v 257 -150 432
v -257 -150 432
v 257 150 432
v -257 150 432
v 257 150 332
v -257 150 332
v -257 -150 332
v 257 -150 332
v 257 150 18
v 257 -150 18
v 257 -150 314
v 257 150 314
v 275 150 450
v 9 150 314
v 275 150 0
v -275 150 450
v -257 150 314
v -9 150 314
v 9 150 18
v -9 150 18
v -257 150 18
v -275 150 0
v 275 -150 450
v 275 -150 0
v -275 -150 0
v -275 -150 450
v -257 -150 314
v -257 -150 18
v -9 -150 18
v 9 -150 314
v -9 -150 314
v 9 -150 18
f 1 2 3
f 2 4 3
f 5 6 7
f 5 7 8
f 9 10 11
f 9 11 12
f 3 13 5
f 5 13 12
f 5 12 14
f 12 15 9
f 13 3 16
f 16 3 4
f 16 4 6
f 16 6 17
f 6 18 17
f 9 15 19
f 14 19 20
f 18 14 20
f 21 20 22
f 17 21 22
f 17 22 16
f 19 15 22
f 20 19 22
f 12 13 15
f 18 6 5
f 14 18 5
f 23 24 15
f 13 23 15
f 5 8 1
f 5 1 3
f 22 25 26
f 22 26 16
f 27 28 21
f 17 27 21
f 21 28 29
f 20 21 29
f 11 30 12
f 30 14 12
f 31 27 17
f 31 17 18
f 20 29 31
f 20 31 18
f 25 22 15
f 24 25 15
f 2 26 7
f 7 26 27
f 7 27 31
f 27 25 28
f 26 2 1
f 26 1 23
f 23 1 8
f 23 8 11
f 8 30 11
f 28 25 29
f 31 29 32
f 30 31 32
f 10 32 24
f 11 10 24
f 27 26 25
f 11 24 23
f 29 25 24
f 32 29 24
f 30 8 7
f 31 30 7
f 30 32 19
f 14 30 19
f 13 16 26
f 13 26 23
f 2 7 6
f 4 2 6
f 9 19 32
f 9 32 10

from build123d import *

# Parameters (mm, degrees)
F0_W     = 550
F0_H     = 300
F1_DEPTH = 18
F2_W     = 18
F2_H     = 300
F3_DEPTH = 414
F4_W     = 18
F4_H     = 300
F5_DEPTH = 296
F6_W     = 248
F6_H     = 300
F6_W_2   = 18
F7_DEPTH = 18
F8_W     = 532
F8_H     = 300
F8_W_2   = 18
F9_DEPTH = 18


with BuildPart() as f1:
    # F0 (on Top) → F1 (new body)
    with BuildSketch(Plane.XY):
        Rectangle(F0_W, F0_H)
    extrude(amount=F1_DEPTH)

    # F2 (on face) → F3 (join)
    with BuildSketch(Plane.XY.offset(18)):
        with Locations((-266, 0)):
            Rectangle(F2_W, F2_H)
        with Locations((266, 0)):
            Rectangle(F2_W, F2_H)
    extrude(amount=F3_DEPTH)

    # F4 (on face) → F5 (join)
    with BuildSketch(Plane.XY.offset(18)):
        Rectangle(F4_W, F4_H)
    extrude(amount=F5_DEPTH)

    # F6 (on face) → F7 (join)
    with BuildSketch(Plane.XY.offset(314)):
        with Locations((133, 0)):
            Rectangle(F6_W, F6_H)
        Rectangle(F6_W_2, F6_H)
        with Locations((-133, 0)):
            Rectangle(F6_W, F6_H)
    extrude(amount=F7_DEPTH)

    # F8 (on face) → F9 (join)
    with BuildSketch(Plane.XY.offset(432)):
        with Locations((9, 0)):
            Rectangle(F8_W, F8_H)
        with Locations((-266, 0)):
            Rectangle(F8_W_2, F8_H)
    extrude(amount=F9_DEPTH)


solid = f1.part
